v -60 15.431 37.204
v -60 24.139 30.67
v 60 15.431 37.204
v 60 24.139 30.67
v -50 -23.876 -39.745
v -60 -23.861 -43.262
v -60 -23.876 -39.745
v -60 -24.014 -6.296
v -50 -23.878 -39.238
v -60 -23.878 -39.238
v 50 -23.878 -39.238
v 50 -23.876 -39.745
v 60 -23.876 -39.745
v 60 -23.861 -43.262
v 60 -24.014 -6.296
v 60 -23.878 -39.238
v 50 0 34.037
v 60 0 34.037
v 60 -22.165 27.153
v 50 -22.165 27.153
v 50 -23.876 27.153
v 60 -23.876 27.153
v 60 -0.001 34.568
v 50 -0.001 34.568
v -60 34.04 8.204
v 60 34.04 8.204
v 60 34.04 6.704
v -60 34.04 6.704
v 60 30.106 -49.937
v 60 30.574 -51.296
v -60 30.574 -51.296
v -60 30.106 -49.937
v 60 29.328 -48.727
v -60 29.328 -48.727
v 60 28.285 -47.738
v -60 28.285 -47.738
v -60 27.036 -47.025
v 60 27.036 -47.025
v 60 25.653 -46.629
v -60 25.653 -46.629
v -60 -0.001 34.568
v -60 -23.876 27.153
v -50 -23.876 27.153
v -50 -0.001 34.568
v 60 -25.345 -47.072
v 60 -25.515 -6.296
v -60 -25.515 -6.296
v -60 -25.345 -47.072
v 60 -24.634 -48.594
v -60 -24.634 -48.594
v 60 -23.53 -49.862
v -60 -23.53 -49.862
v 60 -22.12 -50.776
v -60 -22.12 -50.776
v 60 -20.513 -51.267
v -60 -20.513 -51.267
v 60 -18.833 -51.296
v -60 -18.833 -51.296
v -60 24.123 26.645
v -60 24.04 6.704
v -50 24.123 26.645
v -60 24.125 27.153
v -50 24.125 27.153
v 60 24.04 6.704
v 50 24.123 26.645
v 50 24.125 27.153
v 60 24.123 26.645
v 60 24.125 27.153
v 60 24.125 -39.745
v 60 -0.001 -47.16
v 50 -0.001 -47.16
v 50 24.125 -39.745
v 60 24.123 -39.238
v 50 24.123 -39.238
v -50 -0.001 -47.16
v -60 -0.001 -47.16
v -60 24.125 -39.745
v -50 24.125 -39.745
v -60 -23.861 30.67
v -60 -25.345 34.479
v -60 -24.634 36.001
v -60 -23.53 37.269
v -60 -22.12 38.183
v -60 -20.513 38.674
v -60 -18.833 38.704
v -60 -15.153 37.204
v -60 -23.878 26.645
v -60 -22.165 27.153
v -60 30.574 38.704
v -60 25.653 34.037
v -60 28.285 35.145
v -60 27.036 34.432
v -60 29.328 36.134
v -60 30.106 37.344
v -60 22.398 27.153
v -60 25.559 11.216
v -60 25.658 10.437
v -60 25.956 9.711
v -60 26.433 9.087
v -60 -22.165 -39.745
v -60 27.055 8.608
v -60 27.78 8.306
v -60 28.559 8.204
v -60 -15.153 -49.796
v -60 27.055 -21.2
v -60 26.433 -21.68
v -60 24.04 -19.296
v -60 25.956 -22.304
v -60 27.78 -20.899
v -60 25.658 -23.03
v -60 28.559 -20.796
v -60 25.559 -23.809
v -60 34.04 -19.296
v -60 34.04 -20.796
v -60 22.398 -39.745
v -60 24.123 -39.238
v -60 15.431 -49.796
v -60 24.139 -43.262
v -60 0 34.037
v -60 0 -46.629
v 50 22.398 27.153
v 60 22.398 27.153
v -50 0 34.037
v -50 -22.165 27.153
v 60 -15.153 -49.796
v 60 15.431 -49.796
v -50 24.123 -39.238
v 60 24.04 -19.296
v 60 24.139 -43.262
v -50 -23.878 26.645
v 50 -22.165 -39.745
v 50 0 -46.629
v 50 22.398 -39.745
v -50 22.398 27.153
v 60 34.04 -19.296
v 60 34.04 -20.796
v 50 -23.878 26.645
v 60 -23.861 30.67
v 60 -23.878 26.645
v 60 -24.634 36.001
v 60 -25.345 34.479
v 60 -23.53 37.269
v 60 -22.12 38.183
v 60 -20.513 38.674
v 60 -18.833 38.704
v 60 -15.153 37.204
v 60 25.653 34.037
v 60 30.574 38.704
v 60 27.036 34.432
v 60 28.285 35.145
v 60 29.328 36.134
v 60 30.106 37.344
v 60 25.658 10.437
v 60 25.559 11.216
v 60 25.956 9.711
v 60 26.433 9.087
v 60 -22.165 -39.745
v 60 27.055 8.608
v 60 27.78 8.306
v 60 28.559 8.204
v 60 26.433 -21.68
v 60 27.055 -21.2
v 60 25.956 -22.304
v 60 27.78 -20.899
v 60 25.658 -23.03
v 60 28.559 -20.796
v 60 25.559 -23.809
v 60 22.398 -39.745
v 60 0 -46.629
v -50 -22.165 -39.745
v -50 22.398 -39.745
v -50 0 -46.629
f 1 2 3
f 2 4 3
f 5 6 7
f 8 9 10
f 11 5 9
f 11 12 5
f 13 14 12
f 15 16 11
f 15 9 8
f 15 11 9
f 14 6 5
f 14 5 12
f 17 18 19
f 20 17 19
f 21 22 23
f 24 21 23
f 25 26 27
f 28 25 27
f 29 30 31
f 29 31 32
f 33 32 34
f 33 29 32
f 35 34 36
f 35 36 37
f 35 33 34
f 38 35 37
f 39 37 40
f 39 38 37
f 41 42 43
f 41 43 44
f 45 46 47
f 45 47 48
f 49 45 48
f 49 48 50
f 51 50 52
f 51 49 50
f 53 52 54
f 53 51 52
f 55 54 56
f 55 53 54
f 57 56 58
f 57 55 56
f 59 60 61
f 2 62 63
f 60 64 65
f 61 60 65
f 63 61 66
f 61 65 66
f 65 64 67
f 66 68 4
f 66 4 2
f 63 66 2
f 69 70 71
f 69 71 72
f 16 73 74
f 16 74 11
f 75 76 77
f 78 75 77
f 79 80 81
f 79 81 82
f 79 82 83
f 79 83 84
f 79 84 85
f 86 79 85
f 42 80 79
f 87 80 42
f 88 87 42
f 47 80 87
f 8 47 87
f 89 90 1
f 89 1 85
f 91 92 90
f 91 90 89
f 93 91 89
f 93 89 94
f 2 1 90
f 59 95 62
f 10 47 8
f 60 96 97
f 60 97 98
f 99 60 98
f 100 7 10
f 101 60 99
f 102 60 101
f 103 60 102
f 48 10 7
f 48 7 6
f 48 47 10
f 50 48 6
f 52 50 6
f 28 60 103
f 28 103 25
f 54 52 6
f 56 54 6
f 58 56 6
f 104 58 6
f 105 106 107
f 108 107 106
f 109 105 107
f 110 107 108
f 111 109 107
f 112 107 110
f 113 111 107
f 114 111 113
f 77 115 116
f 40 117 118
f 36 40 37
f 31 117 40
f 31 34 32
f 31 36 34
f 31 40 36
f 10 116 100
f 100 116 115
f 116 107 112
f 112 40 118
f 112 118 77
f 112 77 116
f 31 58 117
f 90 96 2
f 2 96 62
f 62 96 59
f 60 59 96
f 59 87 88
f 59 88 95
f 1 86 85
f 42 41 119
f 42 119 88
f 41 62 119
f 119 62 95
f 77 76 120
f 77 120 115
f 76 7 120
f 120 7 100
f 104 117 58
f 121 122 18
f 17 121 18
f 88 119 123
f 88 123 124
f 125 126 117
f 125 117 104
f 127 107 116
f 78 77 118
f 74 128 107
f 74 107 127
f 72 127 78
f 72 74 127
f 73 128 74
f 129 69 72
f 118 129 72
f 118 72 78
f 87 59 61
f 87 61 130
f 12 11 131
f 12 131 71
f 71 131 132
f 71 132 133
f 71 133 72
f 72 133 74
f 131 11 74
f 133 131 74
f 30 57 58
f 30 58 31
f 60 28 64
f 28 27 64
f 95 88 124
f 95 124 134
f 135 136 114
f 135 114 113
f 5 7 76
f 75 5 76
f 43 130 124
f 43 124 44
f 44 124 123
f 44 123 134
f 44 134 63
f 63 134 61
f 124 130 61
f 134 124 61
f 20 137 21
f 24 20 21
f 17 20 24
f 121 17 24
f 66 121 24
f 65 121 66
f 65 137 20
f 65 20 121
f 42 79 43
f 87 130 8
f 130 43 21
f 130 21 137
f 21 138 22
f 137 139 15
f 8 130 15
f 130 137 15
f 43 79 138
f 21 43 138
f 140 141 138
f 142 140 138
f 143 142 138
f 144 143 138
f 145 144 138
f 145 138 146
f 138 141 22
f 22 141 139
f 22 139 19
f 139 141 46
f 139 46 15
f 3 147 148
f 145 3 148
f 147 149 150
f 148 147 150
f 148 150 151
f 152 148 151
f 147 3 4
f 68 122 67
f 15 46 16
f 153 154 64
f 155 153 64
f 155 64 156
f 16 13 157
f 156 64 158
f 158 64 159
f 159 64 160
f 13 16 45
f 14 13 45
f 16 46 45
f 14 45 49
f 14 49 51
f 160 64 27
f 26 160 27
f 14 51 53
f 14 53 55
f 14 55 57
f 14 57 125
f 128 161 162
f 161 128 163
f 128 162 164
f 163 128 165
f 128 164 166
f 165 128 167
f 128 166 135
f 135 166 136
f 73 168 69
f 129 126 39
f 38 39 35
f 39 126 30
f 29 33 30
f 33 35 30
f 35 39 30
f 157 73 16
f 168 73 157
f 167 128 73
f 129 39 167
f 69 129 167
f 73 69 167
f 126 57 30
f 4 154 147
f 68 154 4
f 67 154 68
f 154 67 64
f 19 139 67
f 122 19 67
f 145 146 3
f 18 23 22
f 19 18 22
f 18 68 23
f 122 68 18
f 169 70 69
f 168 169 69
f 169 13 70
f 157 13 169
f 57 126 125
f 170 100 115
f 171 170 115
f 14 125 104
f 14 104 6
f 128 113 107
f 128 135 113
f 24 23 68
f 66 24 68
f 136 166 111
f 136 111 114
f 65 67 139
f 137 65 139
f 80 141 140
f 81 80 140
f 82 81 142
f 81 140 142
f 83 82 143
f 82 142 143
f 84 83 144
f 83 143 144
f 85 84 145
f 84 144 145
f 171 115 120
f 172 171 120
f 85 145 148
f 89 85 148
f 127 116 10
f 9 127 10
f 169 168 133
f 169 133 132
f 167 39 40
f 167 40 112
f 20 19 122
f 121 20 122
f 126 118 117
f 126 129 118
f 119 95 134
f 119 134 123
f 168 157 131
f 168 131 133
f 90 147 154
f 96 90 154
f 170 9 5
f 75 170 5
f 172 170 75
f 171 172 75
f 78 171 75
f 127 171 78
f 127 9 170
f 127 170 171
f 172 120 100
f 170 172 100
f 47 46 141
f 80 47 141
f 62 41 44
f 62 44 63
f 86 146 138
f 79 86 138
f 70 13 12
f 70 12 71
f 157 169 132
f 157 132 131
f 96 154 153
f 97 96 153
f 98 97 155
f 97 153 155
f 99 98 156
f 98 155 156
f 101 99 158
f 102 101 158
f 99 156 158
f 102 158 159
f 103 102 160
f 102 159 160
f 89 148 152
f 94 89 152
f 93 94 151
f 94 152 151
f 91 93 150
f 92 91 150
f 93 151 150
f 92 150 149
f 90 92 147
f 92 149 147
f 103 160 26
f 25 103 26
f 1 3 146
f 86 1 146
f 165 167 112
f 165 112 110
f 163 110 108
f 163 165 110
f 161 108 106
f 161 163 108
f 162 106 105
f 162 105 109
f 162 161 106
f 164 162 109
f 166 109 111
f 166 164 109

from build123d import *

# Parameters (mm, degrees)
F1_DEPTH = 60
F3_DEPTH = 10


# Not quite as in the source:
# - a feature names something its author has since deleted; it is built from what else it names


with BuildPart() as f1:
    # F0 (on Right) → F1 (new body)
    with BuildSketch(Plane.YZ):
        with BuildLine():
            Line((24.139301102, -43.2624049591), (15.4307844338, -49.7964277864))
            Line((15.4307844338, -49.7964277864), (-15.1525954085, -49.7964277864))
            Line((-15.1525954085, -49.7964277864), (-23.8611120767, -43.2624049591))
            Line((-23.8611120767, -43.2624049591), (-24.0144912707, -6.2964277864))
            Line((-24.0144912707, -6.2964277864), (-25.5145041825, -6.2964277864))
            Line((-25.5145041825, -6.2964277864), (-25.3453201973, -47.0715236276))
            ThreePointArc((-25.3453201973, -47.0715236276), (-22.8573335388, -50.3682627369), (-18.8327744315, -51.2964277864))
            Line((-18.8327744315, -51.2964277864), (30.5735625925, -51.2964277864))
            ThreePointArc((30.5735625925, -51.2964277864), (28.8360021374, -48.2011592055), (25.6532847593, -46.6294995689))
            Line((25.6532847593, -46.6294995689), (25.5585974487, -23.8088752761))
            ThreePointArc((25.5585974487, -23.8088752761), (26.432854985, -21.6795128694), (28.5585716253, -20.7964277864))
            Line((28.5585716253, -20.7964277864), (34.0398614944, -20.7964277864))
            Line((34.0398614944, -20.7964277864), (34.0398614944, -19.2964277864))
            Line((34.0398614944, -19.2964277864), (24.0398614944, -19.2964277864))
            Line((24.0398614944, -19.2964277864), (24.139301102, -43.2624049591))
        make_face()
    extrude(amount=F1_DEPTH)

    # F2 (on face) → F3 (join)
    with BuildSketch(Plane.YZ.offset(60)):
        Polygon((24.1226036063, -39.2381352516), (-23.8778095724, -39.2381352516), (-23.8757047067, -39.7454297089), (-0.0007817785, -47.1604929972), (24.1247084719, -39.7454297089), align=None)
        Polygon((0, -46.6294995689), (-22.1652372944, -39.7454297089), (22.3978614654, -39.7454297089), align=None, mode=Mode.SUBTRACT)
    extrude(amount=-F3_DEPTH)

    # F4: F1 across plane


with BuildPart() as f1_1:
    add(f1.part)
    add(f1.part.mirror(Plane.YZ))

    # F5: F1 across face


with BuildPart() as f1_2:
    add(f1_1.part)
    add(f1_1.part.mirror(Plane(origin=(0, -24.7644977266, -6.2964277864), x_dir=(1, 0, 0), z_dir=(0, 0, 1))))


solid = f1_2.part
